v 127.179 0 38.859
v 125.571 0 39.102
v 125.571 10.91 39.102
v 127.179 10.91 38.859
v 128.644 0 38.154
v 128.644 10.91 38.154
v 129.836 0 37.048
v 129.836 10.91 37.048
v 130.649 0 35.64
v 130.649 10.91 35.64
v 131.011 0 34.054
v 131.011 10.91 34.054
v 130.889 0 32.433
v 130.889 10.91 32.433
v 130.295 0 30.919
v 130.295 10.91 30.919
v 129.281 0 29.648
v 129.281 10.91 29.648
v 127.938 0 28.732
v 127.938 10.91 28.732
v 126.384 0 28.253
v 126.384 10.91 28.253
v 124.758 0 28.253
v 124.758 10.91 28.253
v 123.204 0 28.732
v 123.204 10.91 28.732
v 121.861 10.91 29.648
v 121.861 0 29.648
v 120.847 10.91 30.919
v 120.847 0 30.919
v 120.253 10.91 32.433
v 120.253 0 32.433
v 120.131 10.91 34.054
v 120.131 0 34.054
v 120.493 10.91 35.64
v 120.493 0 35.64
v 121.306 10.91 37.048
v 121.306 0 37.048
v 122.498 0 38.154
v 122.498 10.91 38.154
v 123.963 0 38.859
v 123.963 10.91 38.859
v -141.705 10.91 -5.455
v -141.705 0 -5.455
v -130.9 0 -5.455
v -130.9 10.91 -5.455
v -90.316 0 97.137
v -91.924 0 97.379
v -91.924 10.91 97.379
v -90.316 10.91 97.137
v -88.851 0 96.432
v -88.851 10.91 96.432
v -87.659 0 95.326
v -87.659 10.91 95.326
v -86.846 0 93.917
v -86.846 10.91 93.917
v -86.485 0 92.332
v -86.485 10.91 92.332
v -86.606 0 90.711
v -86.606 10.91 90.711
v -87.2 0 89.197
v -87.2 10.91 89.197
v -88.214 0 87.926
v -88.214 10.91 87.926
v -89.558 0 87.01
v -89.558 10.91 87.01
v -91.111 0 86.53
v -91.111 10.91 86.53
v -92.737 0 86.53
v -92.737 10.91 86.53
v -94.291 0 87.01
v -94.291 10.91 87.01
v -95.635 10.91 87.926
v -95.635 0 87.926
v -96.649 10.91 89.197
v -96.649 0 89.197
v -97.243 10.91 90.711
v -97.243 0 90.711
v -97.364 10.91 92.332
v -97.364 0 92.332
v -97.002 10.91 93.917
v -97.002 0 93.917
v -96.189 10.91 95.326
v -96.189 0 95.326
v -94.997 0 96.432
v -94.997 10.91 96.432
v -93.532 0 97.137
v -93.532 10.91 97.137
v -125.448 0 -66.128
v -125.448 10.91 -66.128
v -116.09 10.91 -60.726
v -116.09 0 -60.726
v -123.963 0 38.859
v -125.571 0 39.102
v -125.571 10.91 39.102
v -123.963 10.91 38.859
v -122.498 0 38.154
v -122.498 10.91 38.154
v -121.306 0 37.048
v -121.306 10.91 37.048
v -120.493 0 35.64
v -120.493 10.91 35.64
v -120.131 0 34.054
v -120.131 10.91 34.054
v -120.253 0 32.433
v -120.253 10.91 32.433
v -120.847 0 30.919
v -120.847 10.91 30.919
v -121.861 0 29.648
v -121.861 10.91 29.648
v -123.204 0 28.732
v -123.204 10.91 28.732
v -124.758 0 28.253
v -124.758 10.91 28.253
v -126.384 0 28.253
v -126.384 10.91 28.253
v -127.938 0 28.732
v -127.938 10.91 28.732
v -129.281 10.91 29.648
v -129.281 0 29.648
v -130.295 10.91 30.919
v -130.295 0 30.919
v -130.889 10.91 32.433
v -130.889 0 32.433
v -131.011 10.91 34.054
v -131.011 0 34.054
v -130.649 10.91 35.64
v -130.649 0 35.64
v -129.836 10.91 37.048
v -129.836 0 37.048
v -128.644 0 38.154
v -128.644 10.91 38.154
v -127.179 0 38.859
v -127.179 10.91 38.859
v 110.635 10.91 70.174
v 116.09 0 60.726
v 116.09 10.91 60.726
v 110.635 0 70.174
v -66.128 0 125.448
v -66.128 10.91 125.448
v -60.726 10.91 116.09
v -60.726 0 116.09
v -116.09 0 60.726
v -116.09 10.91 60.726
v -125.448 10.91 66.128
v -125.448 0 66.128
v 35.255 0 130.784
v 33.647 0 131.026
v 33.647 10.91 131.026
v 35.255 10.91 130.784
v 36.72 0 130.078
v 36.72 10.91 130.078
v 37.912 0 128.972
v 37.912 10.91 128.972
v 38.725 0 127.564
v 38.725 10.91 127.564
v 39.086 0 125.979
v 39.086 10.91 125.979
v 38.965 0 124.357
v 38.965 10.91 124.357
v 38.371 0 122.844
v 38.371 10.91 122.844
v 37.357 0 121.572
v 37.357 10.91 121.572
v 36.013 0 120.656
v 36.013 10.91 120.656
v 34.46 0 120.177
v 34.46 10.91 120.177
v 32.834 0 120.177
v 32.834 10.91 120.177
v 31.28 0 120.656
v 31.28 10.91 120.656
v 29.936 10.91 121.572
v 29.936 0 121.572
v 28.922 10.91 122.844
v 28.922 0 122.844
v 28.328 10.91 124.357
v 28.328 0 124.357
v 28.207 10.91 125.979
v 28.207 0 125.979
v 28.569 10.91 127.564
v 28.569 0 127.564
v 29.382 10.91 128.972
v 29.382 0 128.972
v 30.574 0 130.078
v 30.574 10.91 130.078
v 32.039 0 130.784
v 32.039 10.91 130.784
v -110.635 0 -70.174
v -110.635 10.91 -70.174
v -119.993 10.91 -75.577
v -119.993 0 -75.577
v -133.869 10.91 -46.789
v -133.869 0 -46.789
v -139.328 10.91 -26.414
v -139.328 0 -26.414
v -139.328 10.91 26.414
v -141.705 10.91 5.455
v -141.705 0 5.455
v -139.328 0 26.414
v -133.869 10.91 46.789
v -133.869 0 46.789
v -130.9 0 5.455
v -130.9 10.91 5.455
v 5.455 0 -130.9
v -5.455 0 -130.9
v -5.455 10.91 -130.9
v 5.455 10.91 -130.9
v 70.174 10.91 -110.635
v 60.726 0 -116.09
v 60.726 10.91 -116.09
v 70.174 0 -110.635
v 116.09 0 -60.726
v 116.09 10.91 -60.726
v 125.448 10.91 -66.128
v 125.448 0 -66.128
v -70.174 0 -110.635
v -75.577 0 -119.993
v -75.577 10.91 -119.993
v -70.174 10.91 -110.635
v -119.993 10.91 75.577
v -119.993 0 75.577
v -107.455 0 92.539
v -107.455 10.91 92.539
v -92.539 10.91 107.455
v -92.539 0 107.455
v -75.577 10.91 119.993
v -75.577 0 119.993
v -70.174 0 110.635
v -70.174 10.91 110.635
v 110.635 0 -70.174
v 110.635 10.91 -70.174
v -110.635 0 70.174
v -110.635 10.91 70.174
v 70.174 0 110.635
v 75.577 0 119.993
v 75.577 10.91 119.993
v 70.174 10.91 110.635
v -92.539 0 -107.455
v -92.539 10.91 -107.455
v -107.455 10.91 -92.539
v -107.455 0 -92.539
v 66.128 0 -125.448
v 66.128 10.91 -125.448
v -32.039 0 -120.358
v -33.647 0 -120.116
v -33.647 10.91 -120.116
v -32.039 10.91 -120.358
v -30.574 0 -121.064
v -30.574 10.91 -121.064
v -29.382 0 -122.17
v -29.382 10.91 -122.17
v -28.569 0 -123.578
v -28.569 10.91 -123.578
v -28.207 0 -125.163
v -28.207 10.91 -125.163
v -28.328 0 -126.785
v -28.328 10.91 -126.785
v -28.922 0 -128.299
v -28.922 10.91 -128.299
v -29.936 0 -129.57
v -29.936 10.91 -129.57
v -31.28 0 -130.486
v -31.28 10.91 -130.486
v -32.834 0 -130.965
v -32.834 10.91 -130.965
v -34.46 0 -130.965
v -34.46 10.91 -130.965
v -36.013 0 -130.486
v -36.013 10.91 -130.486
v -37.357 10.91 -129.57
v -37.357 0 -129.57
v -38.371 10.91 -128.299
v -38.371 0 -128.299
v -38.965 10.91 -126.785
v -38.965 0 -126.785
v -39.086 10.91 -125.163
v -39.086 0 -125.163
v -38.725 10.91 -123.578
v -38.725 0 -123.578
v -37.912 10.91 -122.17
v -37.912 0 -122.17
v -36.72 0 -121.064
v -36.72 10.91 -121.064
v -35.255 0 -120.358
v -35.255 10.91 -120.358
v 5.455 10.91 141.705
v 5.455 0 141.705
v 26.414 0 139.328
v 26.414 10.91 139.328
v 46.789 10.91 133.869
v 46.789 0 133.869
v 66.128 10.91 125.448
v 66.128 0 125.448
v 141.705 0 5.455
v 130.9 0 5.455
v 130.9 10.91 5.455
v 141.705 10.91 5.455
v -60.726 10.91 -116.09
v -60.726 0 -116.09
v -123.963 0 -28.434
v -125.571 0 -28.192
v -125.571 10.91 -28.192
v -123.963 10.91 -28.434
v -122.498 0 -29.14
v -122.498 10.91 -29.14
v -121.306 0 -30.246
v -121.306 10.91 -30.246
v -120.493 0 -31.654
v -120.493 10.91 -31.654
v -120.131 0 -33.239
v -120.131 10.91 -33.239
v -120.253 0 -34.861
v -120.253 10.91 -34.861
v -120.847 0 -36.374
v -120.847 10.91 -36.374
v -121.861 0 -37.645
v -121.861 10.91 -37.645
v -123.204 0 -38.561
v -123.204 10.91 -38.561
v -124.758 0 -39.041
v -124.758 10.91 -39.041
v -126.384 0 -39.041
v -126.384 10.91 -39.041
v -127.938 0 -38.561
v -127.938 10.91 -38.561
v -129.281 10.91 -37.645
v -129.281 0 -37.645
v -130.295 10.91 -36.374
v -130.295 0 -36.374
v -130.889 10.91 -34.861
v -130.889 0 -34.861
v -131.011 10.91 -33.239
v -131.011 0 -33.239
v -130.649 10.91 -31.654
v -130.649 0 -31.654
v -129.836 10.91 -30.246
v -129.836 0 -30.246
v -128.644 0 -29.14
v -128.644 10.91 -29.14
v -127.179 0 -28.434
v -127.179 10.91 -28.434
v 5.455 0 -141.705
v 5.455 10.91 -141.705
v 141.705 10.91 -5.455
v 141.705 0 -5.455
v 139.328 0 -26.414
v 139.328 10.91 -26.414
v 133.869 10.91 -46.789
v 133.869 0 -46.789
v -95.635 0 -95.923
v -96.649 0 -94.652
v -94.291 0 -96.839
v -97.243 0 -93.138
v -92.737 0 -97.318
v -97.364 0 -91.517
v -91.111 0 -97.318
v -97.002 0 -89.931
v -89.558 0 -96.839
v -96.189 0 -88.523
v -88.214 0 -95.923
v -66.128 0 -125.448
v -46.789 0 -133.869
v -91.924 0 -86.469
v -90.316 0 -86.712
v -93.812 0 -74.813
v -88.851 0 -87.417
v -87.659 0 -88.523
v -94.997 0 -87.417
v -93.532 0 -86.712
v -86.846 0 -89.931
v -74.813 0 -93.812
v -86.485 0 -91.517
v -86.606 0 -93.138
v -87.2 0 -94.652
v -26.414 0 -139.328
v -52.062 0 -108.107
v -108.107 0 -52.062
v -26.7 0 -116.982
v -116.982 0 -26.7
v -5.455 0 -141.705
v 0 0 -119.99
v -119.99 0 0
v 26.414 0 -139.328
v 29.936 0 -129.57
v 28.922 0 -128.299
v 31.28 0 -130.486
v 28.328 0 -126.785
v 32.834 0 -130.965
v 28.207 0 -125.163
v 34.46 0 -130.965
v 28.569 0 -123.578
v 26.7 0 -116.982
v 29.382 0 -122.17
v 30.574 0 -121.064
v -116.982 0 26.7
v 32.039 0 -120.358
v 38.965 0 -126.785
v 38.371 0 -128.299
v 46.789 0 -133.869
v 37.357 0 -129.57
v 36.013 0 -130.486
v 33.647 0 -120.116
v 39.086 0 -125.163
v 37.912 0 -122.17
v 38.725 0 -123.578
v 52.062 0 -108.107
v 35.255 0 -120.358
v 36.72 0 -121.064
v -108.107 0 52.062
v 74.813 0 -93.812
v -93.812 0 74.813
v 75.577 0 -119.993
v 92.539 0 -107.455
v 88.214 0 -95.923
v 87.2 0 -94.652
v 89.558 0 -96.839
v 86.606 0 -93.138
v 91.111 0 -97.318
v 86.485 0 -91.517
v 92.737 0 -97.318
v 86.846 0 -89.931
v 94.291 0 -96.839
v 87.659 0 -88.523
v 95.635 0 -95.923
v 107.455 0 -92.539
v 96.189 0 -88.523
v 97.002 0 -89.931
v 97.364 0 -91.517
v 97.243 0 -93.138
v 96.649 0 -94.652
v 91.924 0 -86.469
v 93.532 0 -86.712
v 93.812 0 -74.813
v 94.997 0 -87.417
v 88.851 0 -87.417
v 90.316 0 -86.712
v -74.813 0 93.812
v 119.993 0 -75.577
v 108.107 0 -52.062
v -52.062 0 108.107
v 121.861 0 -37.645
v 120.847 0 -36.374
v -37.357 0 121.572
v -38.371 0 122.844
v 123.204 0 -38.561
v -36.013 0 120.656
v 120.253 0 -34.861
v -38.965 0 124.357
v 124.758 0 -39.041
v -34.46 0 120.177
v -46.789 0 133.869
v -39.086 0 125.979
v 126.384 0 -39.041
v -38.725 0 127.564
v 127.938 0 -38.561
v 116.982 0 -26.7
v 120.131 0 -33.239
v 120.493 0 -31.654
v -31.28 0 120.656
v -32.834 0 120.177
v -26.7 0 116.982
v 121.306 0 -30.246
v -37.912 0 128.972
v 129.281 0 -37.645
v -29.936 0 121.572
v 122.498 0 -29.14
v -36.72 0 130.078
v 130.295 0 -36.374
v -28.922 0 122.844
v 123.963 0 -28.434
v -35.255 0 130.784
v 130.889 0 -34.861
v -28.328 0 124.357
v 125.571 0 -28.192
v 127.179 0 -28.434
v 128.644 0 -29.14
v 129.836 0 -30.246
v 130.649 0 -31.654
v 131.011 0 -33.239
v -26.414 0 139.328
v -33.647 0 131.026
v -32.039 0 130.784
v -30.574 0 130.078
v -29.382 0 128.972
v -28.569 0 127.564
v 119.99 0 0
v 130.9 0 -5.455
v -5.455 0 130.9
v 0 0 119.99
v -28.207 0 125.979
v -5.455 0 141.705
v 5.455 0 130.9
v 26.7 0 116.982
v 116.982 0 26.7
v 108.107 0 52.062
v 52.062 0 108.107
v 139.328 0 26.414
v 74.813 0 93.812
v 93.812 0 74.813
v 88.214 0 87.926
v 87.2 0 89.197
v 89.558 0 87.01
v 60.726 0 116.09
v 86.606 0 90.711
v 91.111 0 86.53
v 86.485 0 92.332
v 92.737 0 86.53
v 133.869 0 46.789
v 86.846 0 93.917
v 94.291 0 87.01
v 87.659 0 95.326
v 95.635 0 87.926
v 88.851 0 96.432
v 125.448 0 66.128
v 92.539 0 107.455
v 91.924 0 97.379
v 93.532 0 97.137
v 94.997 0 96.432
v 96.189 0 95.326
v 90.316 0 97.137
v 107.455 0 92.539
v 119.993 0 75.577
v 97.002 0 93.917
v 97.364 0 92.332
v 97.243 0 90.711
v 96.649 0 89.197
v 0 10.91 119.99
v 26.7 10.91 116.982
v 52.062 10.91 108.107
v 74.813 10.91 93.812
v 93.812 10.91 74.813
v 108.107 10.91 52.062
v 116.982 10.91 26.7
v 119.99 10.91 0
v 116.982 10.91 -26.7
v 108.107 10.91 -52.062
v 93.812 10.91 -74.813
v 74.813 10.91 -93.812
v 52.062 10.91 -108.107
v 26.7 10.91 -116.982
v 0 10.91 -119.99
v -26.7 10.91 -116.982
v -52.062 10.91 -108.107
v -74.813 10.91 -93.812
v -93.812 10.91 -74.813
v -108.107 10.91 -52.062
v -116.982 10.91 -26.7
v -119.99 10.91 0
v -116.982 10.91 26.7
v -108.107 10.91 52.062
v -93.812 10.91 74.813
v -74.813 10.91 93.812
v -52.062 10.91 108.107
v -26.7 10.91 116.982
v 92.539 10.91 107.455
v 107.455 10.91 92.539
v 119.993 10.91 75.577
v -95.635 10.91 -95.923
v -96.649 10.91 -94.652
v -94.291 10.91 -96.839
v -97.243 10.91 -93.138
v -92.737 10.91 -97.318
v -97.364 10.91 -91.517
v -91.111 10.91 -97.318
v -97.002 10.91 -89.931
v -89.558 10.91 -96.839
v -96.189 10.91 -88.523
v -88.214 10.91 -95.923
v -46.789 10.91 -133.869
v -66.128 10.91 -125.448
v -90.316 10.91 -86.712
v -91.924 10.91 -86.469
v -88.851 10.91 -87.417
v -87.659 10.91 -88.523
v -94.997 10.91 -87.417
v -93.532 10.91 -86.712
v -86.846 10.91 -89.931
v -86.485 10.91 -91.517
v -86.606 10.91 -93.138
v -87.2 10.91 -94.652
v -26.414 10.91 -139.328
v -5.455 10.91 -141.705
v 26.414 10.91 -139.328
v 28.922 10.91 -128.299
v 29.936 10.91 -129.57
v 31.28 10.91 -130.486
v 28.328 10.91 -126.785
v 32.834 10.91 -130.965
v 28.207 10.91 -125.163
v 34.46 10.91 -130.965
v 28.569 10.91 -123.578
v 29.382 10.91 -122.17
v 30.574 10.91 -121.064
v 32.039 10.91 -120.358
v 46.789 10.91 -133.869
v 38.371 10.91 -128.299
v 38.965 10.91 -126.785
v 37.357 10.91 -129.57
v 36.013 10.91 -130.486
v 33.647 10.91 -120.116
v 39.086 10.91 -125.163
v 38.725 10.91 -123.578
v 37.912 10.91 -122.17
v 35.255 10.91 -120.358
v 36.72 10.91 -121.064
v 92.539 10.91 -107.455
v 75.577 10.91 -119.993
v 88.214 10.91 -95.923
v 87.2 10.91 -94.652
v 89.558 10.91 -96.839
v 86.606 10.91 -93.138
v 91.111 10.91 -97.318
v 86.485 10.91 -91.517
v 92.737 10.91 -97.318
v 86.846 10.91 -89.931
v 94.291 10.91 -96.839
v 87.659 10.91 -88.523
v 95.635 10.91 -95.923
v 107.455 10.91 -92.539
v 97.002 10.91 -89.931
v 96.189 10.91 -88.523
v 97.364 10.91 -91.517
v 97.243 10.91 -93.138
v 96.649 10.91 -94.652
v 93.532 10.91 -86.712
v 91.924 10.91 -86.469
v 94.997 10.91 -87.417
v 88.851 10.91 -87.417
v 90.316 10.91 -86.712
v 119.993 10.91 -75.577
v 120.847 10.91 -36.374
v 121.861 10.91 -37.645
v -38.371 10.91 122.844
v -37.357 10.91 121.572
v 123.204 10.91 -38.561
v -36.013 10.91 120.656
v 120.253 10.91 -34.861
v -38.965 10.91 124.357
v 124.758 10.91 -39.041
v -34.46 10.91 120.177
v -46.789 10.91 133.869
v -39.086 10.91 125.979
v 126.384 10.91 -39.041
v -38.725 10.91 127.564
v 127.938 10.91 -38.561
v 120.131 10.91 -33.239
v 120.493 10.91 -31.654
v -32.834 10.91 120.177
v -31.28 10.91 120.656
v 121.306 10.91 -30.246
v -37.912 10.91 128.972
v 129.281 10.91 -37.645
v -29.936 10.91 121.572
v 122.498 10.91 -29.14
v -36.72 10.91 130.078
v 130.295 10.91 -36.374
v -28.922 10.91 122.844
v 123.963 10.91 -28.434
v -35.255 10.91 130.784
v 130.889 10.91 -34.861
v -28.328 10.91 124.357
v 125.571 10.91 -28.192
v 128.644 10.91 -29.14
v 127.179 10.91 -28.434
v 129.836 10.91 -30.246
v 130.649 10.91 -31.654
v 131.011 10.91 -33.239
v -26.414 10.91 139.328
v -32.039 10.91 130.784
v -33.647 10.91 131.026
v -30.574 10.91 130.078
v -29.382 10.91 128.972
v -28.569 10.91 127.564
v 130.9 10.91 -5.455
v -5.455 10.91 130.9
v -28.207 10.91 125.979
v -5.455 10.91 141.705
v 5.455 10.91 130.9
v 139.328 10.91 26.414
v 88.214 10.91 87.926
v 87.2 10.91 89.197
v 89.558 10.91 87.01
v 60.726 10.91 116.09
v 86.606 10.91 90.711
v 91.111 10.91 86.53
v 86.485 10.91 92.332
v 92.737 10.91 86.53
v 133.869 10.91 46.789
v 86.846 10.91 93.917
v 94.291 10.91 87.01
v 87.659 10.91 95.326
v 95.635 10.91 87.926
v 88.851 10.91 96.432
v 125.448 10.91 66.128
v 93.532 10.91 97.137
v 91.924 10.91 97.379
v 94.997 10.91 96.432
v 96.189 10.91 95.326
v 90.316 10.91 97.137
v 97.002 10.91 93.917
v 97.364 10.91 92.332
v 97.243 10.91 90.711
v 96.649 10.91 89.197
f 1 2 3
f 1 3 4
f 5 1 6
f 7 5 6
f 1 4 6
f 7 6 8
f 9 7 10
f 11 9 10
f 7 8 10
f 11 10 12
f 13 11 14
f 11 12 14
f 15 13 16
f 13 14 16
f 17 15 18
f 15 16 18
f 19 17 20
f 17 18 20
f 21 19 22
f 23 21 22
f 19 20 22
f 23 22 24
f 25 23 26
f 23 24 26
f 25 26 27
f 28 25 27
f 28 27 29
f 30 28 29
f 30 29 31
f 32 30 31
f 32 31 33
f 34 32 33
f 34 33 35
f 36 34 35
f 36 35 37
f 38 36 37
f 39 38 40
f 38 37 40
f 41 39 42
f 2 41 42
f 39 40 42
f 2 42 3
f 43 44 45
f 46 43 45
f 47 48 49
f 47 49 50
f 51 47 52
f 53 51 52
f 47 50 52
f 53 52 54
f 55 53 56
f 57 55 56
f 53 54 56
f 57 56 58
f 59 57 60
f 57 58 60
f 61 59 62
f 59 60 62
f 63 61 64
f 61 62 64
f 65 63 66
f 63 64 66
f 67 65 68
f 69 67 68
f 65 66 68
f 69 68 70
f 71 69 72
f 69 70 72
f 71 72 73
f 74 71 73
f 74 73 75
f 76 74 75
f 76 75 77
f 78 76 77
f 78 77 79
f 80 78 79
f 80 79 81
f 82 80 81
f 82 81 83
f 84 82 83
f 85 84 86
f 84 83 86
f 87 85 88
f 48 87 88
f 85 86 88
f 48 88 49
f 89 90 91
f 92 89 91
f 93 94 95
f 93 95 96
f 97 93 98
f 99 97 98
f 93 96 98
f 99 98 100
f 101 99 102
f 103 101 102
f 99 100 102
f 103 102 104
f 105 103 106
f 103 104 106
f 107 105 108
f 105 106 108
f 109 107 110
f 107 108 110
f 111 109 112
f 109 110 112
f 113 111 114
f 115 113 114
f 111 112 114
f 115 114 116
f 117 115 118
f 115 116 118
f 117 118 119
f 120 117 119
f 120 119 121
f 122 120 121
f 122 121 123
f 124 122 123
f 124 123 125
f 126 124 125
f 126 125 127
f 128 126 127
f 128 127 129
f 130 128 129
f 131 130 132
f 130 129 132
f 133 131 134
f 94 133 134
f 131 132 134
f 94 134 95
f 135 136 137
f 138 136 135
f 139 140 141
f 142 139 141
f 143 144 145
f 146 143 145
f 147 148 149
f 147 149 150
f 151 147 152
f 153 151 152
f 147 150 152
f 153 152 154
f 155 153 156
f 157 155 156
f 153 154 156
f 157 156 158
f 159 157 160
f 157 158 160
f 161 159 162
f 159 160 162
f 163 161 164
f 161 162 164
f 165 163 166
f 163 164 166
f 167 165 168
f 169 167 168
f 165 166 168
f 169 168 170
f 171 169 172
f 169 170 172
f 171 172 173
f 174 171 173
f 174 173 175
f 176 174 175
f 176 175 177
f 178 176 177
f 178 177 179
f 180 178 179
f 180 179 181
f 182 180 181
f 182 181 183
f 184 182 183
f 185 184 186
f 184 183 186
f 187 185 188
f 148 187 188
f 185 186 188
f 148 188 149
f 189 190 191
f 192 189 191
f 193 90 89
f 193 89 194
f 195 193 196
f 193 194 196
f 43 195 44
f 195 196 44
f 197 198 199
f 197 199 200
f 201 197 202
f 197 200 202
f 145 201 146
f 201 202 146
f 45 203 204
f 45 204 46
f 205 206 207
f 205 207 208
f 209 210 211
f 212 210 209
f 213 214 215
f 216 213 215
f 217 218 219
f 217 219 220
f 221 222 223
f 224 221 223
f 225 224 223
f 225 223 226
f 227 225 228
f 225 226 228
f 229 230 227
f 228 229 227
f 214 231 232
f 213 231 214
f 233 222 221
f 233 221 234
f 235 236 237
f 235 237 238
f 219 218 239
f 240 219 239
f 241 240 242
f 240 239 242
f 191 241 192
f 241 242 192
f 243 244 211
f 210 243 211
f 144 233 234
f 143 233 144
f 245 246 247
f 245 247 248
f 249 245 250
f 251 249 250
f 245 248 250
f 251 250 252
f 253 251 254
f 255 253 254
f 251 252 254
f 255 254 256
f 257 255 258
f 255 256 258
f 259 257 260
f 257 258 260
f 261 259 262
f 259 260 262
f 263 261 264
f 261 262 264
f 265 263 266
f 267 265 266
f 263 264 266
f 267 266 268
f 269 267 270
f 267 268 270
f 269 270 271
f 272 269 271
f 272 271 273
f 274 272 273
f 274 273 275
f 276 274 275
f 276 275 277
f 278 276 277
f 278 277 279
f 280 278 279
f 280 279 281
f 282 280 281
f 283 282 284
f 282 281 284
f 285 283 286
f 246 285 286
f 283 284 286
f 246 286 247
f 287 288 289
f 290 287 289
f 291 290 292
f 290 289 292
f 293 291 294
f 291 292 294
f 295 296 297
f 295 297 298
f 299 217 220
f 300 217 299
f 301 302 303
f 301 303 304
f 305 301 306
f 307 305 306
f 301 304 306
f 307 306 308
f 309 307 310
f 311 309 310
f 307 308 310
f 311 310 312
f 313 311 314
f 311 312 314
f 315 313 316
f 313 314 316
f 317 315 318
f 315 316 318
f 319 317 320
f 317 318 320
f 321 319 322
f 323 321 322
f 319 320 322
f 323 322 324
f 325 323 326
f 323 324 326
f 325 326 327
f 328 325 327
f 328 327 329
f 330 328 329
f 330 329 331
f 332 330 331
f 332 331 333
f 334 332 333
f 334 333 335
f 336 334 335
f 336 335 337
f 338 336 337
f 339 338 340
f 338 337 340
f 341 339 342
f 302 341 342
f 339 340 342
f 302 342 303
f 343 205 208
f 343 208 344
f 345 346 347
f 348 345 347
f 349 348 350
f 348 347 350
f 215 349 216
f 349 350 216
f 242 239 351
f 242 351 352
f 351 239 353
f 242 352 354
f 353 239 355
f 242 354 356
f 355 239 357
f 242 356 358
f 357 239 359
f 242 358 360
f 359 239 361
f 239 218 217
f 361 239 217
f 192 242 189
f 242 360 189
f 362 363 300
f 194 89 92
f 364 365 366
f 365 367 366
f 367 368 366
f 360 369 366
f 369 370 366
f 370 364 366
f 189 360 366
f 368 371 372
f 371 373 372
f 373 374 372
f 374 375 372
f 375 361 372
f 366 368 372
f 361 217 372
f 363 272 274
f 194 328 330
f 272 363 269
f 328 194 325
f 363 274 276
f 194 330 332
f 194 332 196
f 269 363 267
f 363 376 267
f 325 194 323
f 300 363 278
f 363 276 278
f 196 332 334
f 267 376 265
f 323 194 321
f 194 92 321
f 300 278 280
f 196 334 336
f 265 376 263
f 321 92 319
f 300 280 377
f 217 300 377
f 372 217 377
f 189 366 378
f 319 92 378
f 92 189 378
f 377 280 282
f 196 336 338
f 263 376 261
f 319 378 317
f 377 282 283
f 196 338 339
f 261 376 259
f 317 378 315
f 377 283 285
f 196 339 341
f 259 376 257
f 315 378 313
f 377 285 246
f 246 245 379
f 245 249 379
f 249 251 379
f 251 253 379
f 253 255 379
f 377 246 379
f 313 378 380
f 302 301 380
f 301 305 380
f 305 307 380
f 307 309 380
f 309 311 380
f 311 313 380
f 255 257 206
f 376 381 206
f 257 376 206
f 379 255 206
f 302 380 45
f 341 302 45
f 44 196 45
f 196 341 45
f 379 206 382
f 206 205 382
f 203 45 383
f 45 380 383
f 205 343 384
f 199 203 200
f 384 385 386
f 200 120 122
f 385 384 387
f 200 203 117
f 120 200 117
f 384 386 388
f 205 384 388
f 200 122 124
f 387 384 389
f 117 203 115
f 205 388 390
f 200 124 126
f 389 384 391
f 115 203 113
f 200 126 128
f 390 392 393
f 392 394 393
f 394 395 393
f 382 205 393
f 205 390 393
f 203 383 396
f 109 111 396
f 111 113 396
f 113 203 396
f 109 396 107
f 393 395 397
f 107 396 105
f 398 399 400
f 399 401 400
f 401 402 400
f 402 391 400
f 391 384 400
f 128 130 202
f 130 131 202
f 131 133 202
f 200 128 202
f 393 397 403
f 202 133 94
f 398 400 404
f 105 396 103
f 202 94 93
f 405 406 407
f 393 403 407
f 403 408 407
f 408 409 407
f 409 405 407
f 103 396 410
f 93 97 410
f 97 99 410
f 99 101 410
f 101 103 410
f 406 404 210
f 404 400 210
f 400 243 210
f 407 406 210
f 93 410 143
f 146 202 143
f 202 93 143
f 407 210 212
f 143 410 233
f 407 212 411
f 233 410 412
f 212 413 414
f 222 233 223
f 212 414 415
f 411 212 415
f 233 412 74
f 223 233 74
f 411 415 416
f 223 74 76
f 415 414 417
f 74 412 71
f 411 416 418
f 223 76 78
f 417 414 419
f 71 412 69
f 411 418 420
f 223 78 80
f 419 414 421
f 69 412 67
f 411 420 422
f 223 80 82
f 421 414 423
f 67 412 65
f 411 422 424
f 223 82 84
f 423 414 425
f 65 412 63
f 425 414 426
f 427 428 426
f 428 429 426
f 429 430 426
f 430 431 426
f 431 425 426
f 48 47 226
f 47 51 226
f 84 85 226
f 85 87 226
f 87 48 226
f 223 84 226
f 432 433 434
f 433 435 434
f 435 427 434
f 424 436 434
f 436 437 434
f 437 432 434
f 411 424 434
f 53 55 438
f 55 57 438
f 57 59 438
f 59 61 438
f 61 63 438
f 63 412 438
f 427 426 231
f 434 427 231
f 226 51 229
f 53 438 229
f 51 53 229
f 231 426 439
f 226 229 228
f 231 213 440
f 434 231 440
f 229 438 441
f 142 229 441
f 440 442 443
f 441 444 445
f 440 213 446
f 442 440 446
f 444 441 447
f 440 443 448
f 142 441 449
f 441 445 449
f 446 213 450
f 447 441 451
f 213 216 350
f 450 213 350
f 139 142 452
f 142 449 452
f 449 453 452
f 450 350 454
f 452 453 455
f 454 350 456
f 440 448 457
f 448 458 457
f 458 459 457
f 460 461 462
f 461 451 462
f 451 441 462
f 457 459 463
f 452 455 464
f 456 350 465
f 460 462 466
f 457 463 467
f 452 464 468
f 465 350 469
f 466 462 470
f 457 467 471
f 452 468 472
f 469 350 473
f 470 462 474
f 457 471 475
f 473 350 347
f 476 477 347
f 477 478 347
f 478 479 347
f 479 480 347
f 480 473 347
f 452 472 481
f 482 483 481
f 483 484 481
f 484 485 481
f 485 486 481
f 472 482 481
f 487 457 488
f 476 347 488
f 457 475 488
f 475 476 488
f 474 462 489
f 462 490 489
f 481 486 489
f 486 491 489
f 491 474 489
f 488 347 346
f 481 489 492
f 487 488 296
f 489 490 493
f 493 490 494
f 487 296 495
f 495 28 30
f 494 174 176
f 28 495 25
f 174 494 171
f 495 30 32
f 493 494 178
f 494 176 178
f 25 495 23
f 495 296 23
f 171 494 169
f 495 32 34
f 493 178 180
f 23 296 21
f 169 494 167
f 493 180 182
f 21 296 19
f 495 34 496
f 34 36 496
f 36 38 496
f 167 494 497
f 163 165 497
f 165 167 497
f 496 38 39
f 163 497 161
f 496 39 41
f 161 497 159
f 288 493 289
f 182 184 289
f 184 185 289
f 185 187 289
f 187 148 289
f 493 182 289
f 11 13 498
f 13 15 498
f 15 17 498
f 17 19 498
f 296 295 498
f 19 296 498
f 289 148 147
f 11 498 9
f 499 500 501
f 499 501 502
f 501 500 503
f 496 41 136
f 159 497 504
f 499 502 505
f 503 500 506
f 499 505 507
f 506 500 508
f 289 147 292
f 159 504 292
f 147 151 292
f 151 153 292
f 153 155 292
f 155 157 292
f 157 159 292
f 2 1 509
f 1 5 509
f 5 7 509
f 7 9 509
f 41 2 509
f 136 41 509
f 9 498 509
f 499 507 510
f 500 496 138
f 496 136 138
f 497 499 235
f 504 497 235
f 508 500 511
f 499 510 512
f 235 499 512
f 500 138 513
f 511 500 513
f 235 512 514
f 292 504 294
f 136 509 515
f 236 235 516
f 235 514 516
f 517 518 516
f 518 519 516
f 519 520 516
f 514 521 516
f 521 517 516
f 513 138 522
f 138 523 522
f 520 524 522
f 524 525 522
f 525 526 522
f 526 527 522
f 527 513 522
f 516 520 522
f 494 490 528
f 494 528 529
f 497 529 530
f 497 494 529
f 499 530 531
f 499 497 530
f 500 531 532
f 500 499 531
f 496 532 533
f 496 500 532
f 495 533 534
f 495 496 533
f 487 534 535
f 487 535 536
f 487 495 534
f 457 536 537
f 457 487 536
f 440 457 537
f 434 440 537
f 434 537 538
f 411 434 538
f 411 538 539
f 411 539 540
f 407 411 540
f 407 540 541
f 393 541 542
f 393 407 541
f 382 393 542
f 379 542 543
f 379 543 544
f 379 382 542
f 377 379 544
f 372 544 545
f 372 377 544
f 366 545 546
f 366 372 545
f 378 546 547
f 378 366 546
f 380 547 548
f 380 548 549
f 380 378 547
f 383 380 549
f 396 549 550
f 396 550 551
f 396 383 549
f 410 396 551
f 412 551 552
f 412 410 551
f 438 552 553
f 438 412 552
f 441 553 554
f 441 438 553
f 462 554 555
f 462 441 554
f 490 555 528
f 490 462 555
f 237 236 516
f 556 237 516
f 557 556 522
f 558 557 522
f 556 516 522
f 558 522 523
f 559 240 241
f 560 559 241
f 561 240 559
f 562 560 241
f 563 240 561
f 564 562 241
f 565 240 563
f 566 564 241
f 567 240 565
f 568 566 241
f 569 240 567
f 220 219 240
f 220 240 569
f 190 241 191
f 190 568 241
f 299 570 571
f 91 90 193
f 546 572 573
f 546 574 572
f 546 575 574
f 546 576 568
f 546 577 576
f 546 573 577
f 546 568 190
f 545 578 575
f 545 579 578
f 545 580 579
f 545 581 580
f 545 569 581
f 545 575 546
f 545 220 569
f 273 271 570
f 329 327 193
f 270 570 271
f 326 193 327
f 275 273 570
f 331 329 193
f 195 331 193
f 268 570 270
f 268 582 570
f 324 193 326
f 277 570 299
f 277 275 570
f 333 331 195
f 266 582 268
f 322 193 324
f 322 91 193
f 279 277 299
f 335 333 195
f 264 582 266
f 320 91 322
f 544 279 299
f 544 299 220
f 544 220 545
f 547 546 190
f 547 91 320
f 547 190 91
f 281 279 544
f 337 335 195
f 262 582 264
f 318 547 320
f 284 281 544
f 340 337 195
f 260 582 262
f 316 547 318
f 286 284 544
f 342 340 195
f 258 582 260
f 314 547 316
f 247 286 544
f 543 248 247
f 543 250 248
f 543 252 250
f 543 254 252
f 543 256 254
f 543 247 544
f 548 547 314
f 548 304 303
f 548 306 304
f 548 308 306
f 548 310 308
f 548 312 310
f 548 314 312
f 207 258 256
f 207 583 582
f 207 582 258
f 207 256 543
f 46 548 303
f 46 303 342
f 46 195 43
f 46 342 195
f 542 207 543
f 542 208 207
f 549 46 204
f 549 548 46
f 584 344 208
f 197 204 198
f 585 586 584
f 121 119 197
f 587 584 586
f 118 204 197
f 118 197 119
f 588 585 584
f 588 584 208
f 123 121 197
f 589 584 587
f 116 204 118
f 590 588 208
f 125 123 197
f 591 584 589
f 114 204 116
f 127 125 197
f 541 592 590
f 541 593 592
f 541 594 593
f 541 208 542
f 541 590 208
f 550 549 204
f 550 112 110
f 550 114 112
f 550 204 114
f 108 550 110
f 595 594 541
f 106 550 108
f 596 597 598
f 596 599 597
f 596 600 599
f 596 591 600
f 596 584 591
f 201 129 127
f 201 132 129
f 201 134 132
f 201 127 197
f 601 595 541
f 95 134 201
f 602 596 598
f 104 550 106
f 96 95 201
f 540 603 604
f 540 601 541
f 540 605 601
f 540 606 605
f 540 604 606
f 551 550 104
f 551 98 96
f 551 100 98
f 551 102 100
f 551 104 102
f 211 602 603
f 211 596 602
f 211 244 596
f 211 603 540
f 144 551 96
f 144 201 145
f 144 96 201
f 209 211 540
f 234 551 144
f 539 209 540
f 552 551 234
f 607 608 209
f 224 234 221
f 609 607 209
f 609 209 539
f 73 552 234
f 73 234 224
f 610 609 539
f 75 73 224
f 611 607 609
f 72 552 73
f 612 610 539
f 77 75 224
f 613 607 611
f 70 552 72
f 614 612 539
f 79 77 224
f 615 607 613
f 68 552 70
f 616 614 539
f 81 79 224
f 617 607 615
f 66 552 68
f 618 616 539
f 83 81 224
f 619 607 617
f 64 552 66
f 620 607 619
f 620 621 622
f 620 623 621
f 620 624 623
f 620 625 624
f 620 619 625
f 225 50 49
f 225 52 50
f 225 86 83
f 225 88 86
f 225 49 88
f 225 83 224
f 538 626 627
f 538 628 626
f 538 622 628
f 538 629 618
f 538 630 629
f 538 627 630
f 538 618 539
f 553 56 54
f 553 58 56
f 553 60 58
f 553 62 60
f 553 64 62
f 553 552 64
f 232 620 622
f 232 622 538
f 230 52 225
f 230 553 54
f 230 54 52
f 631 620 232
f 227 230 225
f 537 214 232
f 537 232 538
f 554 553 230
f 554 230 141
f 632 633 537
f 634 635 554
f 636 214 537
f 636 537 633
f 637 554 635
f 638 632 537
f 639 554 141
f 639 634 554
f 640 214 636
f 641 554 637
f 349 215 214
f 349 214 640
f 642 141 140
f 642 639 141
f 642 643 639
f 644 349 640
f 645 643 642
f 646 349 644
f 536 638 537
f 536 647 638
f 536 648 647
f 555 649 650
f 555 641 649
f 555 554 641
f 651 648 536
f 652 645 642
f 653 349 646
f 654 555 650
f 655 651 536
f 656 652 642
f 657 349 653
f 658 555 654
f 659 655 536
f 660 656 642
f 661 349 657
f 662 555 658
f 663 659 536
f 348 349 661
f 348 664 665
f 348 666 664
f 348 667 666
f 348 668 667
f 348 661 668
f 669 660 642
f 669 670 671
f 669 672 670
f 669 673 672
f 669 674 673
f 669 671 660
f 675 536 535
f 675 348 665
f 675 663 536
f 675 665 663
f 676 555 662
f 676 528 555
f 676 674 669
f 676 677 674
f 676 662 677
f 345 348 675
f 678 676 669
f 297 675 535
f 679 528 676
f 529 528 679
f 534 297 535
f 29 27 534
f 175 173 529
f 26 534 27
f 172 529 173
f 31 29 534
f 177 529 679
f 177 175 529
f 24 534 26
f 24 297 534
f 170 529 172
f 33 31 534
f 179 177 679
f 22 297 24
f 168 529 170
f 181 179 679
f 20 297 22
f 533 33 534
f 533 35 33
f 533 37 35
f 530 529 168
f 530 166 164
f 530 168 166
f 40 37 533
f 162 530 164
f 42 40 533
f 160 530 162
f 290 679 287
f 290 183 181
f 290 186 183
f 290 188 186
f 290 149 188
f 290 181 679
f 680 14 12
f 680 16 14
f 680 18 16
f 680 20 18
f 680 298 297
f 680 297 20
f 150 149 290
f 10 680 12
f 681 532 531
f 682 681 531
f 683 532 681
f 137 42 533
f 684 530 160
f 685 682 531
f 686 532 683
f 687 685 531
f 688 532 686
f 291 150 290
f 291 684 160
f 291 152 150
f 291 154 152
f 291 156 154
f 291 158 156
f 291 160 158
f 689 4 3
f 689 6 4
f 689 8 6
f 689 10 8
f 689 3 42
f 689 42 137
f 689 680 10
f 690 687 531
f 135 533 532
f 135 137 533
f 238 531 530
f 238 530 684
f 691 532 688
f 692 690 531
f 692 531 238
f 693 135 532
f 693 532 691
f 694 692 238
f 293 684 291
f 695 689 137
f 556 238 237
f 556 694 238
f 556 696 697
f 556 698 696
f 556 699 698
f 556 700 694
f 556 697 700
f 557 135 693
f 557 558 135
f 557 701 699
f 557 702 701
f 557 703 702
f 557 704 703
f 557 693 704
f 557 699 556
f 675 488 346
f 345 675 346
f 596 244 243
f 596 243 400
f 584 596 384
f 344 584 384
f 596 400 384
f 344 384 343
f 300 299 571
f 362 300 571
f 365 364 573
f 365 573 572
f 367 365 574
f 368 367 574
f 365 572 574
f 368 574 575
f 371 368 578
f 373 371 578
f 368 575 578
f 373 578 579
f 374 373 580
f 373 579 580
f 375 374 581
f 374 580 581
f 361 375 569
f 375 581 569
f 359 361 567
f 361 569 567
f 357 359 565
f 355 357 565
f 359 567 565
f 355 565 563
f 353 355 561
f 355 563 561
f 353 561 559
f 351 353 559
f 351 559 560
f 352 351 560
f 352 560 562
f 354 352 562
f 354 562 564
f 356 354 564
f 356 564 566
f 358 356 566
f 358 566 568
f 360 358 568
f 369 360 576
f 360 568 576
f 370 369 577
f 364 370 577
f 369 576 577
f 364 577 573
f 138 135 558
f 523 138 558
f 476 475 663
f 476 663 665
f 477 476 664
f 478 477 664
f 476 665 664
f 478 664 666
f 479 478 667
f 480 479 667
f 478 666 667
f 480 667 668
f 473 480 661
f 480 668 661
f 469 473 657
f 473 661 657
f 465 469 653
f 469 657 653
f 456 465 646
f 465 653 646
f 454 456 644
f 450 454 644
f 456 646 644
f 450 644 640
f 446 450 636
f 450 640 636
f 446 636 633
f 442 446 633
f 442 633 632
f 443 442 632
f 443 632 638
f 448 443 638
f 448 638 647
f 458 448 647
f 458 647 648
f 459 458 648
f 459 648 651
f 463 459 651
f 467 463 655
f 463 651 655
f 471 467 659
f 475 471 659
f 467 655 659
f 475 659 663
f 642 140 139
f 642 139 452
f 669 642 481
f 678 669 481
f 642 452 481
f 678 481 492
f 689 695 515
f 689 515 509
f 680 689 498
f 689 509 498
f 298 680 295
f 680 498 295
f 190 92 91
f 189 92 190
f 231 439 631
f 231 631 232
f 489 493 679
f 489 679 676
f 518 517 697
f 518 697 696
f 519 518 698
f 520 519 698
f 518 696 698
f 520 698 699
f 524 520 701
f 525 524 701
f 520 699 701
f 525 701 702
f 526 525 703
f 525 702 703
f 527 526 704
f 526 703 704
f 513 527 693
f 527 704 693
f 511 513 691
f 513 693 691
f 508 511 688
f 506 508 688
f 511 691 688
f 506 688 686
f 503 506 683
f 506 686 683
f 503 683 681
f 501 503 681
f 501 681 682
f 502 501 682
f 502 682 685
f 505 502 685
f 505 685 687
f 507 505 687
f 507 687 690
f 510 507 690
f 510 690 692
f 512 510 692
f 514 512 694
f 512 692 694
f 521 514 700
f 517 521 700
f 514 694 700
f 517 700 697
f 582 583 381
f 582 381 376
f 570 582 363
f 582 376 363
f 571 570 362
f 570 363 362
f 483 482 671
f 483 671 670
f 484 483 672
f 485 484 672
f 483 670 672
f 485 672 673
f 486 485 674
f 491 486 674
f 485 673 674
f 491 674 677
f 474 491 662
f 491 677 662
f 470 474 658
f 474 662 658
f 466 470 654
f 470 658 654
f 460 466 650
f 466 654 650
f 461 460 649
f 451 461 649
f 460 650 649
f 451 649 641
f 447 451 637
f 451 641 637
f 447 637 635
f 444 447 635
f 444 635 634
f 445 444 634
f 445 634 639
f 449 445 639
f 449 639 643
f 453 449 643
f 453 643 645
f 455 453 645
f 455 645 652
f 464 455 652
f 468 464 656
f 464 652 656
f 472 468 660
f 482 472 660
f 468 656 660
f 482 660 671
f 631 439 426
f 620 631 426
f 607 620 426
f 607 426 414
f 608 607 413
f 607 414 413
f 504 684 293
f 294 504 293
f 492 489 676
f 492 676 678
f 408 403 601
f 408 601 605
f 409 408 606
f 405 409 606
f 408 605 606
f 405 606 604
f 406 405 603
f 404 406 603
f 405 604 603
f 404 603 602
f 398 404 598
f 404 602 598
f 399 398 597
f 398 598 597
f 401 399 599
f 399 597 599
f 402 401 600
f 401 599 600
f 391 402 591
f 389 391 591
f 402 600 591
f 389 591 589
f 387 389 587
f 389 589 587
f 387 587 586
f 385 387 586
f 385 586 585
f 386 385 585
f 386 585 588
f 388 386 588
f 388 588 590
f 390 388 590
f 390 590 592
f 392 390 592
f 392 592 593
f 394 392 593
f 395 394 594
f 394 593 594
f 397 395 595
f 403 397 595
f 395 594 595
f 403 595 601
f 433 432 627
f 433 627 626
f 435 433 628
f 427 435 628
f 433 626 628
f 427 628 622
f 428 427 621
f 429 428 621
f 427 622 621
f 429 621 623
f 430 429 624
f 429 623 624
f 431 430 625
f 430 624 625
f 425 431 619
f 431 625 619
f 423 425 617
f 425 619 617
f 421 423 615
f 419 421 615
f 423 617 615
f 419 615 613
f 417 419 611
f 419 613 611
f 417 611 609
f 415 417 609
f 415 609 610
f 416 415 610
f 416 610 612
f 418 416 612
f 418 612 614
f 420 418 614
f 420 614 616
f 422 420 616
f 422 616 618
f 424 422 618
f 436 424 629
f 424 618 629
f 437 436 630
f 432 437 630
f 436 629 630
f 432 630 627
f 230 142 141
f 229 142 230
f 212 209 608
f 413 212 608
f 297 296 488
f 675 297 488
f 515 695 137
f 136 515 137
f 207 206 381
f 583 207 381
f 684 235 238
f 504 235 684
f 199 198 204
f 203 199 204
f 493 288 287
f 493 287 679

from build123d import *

# Parameters (mm, degrees)
SKETCH1_R           = 141.81
SKETCH1_R_2         = 119.99
BOSS_EXTRUDE1_DEPTH = 10.91
CUT_EXTRUDE1_START  = -10.91
SKETCH2_W           = 21.82
SKETCH2_H           = 10.91
SKETCH2_W_2         = 10.91
SKETCH2_H_2         = 21.82
CUT_EXTRUDE1_DEPTH  = 10.91
SKETCH3_R           = 5.455
CUT_EXTRUDE2_DEPTH  = 10.91


with BuildPart() as part:
    # Sketch1 → Boss-Extrude1 (new body)
    with BuildSketch(Plane(origin=(0, 0, 0), x_dir=(1, 0, 0), z_dir=(0, 1, 0))):
        with Locations(Location((0, 0, 0), (0, 0, 270))):
            Circle(SKETCH1_R)
        with Locations(Location((0, 0, 0), (0, 0, 270))):
            Circle(SKETCH1_R_2, mode=Mode.SUBTRACT)
    extrude(amount=BOSS_EXTRUDE1_DEPTH)

    # Sketch2 → Cut-Extrude1 (cut)
    with BuildSketch(Plane(origin=(0, 10.91, 0), x_dir=(1, 0, 0), z_dir=(0, 1, 0)).offset(CUT_EXTRUDE1_START)):
        with BuildLine():
            Line((-5.455, -130.9), (-5.455, -141.705042518))
            ThreePointArc((-5.455, -141.705042518), (0, -141.81), (5.455, -141.705042518))
            Line((5.455, -141.705042518), (5.455, -130.9))
            Line((5.455, -130.9), (0, -130.9))
            Line((0, -130.9), (-5.455, -130.9))
        make_face()
        Polygon((-71.635831422, -134.986899666), (-60.725831422, -116.090225355), (-70.174168578, -110.635225355), (-81.084168578, -129.531899666), align=None)
        Polygon((-129.531899666, -81.084168578), (-110.635225355, -70.174168578), (-116.090225355, -60.725831422), (-134.986899666, -71.635831422), align=None)
        with Locations((-141.81, 0)):
            Rectangle(SKETCH2_W, SKETCH2_H)
        Polygon((-134.986899666, 71.635831422), (-116.090225355, 60.725831422), (-110.635225355, 70.174168578), (-129.531899666, 81.084168578), align=None)
        Polygon((-81.084168578, 129.531899666), (-70.174168578, 110.635225355), (-60.725831422, 116.090225355), (-71.635831422, 134.986899666), align=None)
        with Locations((0, 141.81)):
            Rectangle(SKETCH2_W_2, SKETCH2_H_2)
        Polygon((71.635831422, 134.986899666), (60.725831422, 116.090225355), (70.174168578, 110.635225355), (81.084168578, 129.531899666), align=None)
        Polygon((129.531899666, 81.084168578), (110.635225355, 70.174168578), (116.090225355, 60.725831422), (134.986899666, 71.635831422), align=None)
        with Locations((141.81, 0)):
            Rectangle(SKETCH2_W, SKETCH2_H)
        Polygon((134.986899666, -71.635831422), (116.090225355, -60.725831422), (110.635225355, -70.174168578), (129.531899666, -81.084168578), align=None)
        Polygon((81.084168578, -129.531899666), (70.174168578, -110.635225355), (60.725831422, -116.090225355), (71.635831422, -134.986899666), align=None)
    extrude(amount=CUT_EXTRUDE1_DEPTH, mode=Mode.SUBTRACT)

    # Sketch3 → Cut-Extrude2 (cut)
    with BuildSketch(Plane(origin=(0, 10.91, 0), x_dir=(1, 0, 0), z_dir=(0, 1, 0))):
        with Locations(Location((-33.646658285, -125.571038224, 0), (0, 0, 270))):
            Circle(SKETCH3_R)
        with Locations(Location((-91.924379939, -91.924379939, 0), (0, 0, 270))):
            Circle(SKETCH3_R)
        with Locations(Location((-125.571038224, -33.646658285, 0), (0, 0, 270))):
            Circle(SKETCH3_R)
        with Locations(Location((-125.571038224, 33.646658285, 0), (0, 0, 270))):
            Circle(SKETCH3_R)
        with Locations(Location((-91.924379939, 91.924379939, 0), (0, 0, 270))):
            Circle(SKETCH3_R)
        with Locations(Location((-33.646658285, 125.571038224, 0), (0, 0, 270))):
            Circle(SKETCH3_R)
        with Locations(Location((33.646658285, 125.571038224, 0), (0, 0, 270))):
            Circle(SKETCH3_R)
        with Locations(Location((91.924379939, 91.924379939, 0), (0, 0, 270))):
            Circle(SKETCH3_R)
        with Locations(Location((125.571038224, 33.646658285, 0), (0, 0, 270))):
            Circle(SKETCH3_R)
        with Locations(Location((125.571038224, -33.646658285, 0), (0, 0, 270))):
            Circle(SKETCH3_R)
        with Locations(Location((91.924379939, -91.924379939, 0), (0, 0, 270))):
            Circle(SKETCH3_R)
        with Locations(Location((33.646658285, -125.571038224, 0), (0, 0, 270))):
            Circle(SKETCH3_R)
    extrude(amount=-CUT_EXTRUDE2_DEPTH, mode=Mode.SUBTRACT)


solid = part.part
